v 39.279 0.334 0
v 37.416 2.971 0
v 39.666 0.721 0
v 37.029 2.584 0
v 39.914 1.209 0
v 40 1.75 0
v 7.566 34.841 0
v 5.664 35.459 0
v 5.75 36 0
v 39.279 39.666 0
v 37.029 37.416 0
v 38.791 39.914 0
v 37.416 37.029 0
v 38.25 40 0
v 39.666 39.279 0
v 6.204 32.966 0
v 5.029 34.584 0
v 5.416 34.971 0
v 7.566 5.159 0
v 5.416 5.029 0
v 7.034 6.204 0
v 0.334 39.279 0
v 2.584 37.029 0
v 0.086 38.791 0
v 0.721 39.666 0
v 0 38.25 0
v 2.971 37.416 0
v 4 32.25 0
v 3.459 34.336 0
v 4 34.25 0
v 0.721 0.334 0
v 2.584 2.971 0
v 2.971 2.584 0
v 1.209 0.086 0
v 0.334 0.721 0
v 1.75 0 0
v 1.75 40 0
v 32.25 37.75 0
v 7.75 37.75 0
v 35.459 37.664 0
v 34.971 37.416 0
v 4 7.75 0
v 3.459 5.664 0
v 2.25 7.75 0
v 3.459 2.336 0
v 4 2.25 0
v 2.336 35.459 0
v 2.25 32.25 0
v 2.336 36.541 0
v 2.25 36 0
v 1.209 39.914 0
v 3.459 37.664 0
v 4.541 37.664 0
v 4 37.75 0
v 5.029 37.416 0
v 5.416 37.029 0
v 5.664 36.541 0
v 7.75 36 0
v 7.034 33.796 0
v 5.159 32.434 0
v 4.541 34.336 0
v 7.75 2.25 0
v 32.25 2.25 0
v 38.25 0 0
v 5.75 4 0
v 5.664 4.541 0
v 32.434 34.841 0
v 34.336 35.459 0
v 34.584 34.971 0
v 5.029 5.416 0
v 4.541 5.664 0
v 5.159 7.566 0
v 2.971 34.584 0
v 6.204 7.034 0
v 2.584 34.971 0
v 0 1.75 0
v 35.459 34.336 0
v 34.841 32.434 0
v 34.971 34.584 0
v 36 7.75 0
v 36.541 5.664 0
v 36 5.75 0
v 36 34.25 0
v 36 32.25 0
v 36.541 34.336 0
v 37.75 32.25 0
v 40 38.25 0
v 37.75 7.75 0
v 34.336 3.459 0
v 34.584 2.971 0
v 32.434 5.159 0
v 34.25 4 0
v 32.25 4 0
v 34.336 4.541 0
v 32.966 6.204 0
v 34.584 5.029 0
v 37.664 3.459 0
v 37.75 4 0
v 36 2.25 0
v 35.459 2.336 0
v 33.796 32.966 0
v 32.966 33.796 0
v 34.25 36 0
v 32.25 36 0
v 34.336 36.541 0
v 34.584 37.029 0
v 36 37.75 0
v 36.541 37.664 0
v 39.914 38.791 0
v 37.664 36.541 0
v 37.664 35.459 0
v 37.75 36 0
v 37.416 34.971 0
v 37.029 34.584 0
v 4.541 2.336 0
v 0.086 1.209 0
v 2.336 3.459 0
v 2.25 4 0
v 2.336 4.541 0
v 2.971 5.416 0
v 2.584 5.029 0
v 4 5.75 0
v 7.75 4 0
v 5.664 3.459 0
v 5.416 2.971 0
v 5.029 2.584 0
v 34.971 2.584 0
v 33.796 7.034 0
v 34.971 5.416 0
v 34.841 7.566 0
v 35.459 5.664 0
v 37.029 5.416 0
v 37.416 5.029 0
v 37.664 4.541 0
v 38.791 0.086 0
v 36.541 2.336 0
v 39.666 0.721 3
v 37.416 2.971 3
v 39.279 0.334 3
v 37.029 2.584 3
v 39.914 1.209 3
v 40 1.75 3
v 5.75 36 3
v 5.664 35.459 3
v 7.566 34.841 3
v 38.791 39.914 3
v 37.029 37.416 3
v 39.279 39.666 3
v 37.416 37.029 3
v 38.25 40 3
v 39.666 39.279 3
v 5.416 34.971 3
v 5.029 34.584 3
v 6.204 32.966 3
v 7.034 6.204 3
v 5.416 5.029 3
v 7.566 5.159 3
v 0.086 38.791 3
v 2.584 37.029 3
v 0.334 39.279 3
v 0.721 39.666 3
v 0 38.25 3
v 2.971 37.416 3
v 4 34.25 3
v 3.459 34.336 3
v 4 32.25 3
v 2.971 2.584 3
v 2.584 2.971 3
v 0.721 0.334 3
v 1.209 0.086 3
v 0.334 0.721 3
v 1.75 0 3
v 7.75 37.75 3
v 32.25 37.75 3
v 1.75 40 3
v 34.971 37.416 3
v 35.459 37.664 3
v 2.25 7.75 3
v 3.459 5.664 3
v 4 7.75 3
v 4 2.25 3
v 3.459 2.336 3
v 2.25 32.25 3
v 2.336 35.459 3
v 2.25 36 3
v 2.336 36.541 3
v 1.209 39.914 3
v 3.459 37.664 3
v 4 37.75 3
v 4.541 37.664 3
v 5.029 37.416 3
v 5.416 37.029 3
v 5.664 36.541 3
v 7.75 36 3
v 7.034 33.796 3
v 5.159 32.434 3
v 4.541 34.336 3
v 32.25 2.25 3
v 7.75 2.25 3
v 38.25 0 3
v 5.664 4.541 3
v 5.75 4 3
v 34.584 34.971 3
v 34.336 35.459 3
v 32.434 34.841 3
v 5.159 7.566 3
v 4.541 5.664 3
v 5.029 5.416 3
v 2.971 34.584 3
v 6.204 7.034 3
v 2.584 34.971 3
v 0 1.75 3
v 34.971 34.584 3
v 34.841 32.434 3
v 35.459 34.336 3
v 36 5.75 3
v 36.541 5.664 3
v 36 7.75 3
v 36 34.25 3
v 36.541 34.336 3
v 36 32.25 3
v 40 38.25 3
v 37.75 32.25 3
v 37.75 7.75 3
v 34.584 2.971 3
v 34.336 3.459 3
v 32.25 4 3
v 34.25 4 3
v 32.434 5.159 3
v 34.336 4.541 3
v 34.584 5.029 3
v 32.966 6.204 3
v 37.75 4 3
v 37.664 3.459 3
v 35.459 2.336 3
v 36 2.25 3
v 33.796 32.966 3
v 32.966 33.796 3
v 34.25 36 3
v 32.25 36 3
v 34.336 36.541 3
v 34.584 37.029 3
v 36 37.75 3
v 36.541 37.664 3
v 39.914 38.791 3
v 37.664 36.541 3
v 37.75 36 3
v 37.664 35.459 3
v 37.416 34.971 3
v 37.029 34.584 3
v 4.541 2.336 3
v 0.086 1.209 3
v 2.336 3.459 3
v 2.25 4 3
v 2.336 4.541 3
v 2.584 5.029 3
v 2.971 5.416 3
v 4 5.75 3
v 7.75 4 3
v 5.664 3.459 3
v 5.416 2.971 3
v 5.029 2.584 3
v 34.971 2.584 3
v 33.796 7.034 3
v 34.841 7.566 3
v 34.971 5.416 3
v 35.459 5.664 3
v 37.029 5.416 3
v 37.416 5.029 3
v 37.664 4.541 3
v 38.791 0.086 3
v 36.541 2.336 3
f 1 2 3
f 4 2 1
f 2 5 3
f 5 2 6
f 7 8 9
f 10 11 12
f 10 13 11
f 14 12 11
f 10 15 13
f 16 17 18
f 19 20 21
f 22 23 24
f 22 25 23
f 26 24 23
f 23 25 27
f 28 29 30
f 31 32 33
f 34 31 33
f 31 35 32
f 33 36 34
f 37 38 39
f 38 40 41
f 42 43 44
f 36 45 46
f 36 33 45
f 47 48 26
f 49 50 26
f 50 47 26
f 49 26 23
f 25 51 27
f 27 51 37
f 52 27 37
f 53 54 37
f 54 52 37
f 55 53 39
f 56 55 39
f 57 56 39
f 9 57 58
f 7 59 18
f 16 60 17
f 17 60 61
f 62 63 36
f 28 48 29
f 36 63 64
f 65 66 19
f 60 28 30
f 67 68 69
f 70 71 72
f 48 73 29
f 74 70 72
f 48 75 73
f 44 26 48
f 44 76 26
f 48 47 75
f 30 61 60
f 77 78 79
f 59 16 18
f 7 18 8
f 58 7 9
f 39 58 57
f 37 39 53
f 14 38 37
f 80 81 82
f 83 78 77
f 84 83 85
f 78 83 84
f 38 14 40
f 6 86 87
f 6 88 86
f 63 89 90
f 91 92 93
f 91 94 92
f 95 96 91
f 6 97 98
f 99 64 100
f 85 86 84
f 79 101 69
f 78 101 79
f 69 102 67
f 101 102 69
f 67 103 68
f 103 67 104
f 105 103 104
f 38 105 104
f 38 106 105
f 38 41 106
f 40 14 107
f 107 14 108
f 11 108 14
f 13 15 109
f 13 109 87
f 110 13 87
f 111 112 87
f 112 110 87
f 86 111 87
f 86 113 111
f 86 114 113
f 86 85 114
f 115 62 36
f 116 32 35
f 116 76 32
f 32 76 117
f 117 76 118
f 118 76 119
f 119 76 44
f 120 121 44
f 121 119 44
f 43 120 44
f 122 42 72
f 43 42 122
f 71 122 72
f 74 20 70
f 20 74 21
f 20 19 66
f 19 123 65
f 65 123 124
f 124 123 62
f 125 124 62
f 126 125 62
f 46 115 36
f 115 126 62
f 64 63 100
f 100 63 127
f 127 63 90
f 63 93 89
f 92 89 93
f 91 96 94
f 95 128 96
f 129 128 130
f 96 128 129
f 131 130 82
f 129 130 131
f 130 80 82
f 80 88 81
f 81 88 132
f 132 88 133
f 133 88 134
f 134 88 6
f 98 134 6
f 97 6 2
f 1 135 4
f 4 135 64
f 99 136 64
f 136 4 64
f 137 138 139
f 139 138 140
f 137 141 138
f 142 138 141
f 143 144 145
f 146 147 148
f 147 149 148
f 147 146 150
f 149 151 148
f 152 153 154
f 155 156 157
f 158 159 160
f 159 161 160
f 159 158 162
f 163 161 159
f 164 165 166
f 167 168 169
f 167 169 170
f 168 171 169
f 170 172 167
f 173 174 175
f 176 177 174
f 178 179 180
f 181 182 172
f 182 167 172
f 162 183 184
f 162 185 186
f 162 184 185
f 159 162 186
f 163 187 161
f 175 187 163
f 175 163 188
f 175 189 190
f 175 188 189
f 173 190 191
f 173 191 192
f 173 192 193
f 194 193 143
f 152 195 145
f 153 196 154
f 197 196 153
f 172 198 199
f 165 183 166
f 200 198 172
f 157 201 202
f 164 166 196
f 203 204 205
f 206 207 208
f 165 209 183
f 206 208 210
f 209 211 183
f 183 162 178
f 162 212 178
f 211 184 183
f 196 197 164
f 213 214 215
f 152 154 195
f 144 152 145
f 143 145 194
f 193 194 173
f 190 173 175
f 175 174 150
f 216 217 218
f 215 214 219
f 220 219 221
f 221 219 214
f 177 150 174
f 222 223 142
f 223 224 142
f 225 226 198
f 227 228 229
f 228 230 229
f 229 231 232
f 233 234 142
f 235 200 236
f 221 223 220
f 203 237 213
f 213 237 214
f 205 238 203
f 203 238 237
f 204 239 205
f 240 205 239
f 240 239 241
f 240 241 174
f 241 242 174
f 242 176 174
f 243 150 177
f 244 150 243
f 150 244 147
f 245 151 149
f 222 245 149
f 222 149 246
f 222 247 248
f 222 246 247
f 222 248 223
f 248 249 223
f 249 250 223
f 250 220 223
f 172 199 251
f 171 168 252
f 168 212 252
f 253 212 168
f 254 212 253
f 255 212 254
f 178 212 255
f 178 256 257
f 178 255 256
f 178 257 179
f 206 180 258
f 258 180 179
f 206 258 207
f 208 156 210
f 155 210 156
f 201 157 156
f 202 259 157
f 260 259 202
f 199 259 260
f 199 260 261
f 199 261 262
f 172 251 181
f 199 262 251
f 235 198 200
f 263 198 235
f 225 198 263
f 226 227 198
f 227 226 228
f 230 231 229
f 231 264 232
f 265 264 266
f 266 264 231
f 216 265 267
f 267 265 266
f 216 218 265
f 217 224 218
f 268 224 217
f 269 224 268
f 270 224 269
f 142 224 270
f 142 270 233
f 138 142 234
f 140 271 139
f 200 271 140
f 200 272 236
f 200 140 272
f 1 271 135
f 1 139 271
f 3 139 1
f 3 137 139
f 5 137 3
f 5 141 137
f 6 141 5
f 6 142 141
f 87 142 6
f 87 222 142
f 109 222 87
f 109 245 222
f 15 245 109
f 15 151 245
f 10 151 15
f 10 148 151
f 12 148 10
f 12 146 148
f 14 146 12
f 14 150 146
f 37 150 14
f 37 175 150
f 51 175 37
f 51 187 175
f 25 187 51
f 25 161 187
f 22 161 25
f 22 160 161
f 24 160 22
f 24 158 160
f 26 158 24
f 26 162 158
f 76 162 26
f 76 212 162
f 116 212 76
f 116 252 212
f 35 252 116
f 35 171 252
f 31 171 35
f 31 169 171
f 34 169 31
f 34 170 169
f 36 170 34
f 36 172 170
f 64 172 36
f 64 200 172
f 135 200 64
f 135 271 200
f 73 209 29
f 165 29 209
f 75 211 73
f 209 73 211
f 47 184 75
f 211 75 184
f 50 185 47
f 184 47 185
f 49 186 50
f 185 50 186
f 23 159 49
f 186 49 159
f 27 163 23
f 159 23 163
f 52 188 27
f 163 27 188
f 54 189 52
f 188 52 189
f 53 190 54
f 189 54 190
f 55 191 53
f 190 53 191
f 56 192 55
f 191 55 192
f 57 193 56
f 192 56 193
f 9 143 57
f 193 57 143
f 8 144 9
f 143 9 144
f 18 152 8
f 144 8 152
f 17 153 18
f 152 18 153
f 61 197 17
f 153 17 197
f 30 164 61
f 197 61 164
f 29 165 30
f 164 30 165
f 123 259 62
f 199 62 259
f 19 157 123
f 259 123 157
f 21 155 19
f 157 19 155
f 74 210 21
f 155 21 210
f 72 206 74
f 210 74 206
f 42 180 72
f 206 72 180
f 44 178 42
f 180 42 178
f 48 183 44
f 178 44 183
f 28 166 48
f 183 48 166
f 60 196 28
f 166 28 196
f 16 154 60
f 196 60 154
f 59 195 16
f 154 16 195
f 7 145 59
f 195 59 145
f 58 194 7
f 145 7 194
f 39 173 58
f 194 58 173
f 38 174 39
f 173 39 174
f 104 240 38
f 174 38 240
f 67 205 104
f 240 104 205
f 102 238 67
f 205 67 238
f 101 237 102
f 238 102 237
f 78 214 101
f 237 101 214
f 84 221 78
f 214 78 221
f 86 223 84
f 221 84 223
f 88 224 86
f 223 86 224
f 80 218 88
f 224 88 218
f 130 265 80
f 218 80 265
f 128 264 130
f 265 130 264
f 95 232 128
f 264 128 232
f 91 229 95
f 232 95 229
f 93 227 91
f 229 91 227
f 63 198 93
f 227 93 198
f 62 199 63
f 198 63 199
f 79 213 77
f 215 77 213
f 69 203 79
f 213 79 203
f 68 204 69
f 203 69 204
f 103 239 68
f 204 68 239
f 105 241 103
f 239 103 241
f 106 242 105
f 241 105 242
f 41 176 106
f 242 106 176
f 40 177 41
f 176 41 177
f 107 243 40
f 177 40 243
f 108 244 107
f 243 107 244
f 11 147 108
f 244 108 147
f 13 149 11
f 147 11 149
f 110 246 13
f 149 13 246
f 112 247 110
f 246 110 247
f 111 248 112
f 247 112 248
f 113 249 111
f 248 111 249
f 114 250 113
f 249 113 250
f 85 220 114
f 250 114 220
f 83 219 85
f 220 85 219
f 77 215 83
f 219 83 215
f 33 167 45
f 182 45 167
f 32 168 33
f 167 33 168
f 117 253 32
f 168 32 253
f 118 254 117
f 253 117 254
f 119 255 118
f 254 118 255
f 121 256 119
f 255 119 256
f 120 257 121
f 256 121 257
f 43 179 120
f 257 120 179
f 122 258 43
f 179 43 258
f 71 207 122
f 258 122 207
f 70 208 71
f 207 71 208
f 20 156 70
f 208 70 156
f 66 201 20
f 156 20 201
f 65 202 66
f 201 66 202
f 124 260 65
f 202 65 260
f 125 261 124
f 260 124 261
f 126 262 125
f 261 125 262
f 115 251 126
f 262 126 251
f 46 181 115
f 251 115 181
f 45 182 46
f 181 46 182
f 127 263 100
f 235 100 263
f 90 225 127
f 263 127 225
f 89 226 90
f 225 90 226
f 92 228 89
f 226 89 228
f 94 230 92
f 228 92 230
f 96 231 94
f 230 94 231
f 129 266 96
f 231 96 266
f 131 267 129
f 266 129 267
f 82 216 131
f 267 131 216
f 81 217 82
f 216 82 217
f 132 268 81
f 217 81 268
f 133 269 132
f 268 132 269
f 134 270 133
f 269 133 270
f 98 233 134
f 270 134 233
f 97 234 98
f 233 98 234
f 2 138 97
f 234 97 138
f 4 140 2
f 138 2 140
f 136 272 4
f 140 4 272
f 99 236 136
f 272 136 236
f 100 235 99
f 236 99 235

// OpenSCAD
/*
OPENSCAD Library file by the DoomMeister
Mounting surround for small DC fans (25 - 120mm)

Data taken from various places around the internet.
http://www.qwikflow.com/dc_fans.html

//Released under the terms of the GNU GPL v3.0
This program is free software: you can redistribute it and/or modify
it under the terms of the GNU General Public License as published by
the Free Software Foundation, either version 3 of the License, or
(at your option) any later version.

This program is distributed in the hope that it will be useful,
but WITHOUT ANY WARRANTY; without even the implied warranty of
MERCHANTABILITY or FITNESS FOR A PARTICULAR PURPOSE. See the
GNU General Public License for more details.

You should have received a copy of the GNU General Public License
along with this program. If not, see <http://www.gnu.org/licenses/>.
*/

//uncomment this for example
fan_mount(size=40,thick=3);

module fan_mount(size=40,thick = 4)
{
if(size == 25)
	{
	_fan_mount(
			fan_size = 25,
			fan_mounting_pitch = 20,
			fan_m_hole_dia = 3,
			holder_thickness = thick
		 );
	}
if(size == 30)
	{
	_fan_mount(
			fan_size = 30,
			fan_mounting_pitch = 24,
			fan_m_hole_dia = 3,
			holder_thickness = thick
		 );
	}

if(size == 40)
	{
	_fan_mount(
			fan_size = 40,
			fan_mounting_pitch = 32,
			fan_m_hole_dia = 3.5,
			holder_thickness = thick
		 );
	}
if(size == 45)
	{
	_fan_mount(
			fan_size = 45,
			fan_mounting_pitch = 37,
			fan_m_hole_dia = 4.3,
			holder_thickness = thick
		 );
	}
if(size == 60)
	{
	_fan_mount(
			fan_size = 60,
			fan_mounting_pitch = 50,
			fan_m_hole_dia = 4.4,
			holder_thickness = thick
		 );
	}
if(size == 80)
	{
	_fan_mount(
			fan_size = 80,
			fan_mounting_pitch = 71.5,
			fan_m_hole_dia = 4.4,
			holder_thickness = thick
		 );
	}

if(size == 120)
	{
	_fan_mount(
			fan_size = 120,
			fan_mounting_pitch = 105,
			fan_m_hole_dia = 4.4,
			holder_thickness = thick
		 );
	}
}


//inner module
module _fan_mount(
			fan_size, //nominsl size of fan
			fan_mounting_pitch, //pitch between mounting holes
			fan_m_hole_dia, //mounting hole diameter
			holder_thickness //user defined thickness
		 )
{

offset1 = (fan_size-(fan_mounting_pitch + fan_m_hole_dia))/2;
offset2 = (fan_size-(fan_mounting_pitch))/2;
offset3 = offset2 + fan_mounting_pitch;
thickness = (fan_size-fan_mounting_pitch)/2;	
			
			//difference()
			//{
			linear_extrude(height = holder_thickness)
			union()
			{	
			difference()
			{
				translate([fan_m_hole_dia/2,fan_m_hole_dia/2,0])
				minkowski()
				{	
					square([fan_size - fan_m_hole_dia,fan_size - fan_m_hole_dia]);
					circle(r= fan_m_hole_dia/2, $fn=20);
				}
			
					translate([offset1,offset1,0])
					square([fan_mounting_pitch + fan_m_hole_dia,fan_mounting_pitch + fan_m_hole_dia]);
				}
				translate([offset2,offset2,0])
				rotate([0,0,0])_corner_hole();
				translate([offset3,offset2,0])
				rotate([0,0,90])_corner_hole();
				translate([offset2,offset3,0])
				rotate([0,0,90])_corner_hole();
				translate([offset3,offset3,0])
				rotate([0,0,0])_corner_hole();
			}

module _corner_hole()
{
				difference(){
					union(){
							difference(){
							square([fan_m_hole_dia + thickness,fan_m_hole_dia + thickness],center=true);
							square([(fan_m_hole_dia + thickness)/2,(fan_m_hole_dia + thickness)/2],center=false);
							translate([-(fan_m_hole_dia + thickness)/2,-(fan_m_hole_dia + thickness)/2])
							square([(fan_m_hole_dia + thickness)/2,(fan_m_hole_dia + thickness)/2],center=false);
							}
					circle(r=(fan_m_hole_dia + thickness)/2, $fn=20);
					}
					circle(r=(fan_m_hole_dia)/2, $fn=20);
				}
}


echo(offset1,offset2,thickness);
}
